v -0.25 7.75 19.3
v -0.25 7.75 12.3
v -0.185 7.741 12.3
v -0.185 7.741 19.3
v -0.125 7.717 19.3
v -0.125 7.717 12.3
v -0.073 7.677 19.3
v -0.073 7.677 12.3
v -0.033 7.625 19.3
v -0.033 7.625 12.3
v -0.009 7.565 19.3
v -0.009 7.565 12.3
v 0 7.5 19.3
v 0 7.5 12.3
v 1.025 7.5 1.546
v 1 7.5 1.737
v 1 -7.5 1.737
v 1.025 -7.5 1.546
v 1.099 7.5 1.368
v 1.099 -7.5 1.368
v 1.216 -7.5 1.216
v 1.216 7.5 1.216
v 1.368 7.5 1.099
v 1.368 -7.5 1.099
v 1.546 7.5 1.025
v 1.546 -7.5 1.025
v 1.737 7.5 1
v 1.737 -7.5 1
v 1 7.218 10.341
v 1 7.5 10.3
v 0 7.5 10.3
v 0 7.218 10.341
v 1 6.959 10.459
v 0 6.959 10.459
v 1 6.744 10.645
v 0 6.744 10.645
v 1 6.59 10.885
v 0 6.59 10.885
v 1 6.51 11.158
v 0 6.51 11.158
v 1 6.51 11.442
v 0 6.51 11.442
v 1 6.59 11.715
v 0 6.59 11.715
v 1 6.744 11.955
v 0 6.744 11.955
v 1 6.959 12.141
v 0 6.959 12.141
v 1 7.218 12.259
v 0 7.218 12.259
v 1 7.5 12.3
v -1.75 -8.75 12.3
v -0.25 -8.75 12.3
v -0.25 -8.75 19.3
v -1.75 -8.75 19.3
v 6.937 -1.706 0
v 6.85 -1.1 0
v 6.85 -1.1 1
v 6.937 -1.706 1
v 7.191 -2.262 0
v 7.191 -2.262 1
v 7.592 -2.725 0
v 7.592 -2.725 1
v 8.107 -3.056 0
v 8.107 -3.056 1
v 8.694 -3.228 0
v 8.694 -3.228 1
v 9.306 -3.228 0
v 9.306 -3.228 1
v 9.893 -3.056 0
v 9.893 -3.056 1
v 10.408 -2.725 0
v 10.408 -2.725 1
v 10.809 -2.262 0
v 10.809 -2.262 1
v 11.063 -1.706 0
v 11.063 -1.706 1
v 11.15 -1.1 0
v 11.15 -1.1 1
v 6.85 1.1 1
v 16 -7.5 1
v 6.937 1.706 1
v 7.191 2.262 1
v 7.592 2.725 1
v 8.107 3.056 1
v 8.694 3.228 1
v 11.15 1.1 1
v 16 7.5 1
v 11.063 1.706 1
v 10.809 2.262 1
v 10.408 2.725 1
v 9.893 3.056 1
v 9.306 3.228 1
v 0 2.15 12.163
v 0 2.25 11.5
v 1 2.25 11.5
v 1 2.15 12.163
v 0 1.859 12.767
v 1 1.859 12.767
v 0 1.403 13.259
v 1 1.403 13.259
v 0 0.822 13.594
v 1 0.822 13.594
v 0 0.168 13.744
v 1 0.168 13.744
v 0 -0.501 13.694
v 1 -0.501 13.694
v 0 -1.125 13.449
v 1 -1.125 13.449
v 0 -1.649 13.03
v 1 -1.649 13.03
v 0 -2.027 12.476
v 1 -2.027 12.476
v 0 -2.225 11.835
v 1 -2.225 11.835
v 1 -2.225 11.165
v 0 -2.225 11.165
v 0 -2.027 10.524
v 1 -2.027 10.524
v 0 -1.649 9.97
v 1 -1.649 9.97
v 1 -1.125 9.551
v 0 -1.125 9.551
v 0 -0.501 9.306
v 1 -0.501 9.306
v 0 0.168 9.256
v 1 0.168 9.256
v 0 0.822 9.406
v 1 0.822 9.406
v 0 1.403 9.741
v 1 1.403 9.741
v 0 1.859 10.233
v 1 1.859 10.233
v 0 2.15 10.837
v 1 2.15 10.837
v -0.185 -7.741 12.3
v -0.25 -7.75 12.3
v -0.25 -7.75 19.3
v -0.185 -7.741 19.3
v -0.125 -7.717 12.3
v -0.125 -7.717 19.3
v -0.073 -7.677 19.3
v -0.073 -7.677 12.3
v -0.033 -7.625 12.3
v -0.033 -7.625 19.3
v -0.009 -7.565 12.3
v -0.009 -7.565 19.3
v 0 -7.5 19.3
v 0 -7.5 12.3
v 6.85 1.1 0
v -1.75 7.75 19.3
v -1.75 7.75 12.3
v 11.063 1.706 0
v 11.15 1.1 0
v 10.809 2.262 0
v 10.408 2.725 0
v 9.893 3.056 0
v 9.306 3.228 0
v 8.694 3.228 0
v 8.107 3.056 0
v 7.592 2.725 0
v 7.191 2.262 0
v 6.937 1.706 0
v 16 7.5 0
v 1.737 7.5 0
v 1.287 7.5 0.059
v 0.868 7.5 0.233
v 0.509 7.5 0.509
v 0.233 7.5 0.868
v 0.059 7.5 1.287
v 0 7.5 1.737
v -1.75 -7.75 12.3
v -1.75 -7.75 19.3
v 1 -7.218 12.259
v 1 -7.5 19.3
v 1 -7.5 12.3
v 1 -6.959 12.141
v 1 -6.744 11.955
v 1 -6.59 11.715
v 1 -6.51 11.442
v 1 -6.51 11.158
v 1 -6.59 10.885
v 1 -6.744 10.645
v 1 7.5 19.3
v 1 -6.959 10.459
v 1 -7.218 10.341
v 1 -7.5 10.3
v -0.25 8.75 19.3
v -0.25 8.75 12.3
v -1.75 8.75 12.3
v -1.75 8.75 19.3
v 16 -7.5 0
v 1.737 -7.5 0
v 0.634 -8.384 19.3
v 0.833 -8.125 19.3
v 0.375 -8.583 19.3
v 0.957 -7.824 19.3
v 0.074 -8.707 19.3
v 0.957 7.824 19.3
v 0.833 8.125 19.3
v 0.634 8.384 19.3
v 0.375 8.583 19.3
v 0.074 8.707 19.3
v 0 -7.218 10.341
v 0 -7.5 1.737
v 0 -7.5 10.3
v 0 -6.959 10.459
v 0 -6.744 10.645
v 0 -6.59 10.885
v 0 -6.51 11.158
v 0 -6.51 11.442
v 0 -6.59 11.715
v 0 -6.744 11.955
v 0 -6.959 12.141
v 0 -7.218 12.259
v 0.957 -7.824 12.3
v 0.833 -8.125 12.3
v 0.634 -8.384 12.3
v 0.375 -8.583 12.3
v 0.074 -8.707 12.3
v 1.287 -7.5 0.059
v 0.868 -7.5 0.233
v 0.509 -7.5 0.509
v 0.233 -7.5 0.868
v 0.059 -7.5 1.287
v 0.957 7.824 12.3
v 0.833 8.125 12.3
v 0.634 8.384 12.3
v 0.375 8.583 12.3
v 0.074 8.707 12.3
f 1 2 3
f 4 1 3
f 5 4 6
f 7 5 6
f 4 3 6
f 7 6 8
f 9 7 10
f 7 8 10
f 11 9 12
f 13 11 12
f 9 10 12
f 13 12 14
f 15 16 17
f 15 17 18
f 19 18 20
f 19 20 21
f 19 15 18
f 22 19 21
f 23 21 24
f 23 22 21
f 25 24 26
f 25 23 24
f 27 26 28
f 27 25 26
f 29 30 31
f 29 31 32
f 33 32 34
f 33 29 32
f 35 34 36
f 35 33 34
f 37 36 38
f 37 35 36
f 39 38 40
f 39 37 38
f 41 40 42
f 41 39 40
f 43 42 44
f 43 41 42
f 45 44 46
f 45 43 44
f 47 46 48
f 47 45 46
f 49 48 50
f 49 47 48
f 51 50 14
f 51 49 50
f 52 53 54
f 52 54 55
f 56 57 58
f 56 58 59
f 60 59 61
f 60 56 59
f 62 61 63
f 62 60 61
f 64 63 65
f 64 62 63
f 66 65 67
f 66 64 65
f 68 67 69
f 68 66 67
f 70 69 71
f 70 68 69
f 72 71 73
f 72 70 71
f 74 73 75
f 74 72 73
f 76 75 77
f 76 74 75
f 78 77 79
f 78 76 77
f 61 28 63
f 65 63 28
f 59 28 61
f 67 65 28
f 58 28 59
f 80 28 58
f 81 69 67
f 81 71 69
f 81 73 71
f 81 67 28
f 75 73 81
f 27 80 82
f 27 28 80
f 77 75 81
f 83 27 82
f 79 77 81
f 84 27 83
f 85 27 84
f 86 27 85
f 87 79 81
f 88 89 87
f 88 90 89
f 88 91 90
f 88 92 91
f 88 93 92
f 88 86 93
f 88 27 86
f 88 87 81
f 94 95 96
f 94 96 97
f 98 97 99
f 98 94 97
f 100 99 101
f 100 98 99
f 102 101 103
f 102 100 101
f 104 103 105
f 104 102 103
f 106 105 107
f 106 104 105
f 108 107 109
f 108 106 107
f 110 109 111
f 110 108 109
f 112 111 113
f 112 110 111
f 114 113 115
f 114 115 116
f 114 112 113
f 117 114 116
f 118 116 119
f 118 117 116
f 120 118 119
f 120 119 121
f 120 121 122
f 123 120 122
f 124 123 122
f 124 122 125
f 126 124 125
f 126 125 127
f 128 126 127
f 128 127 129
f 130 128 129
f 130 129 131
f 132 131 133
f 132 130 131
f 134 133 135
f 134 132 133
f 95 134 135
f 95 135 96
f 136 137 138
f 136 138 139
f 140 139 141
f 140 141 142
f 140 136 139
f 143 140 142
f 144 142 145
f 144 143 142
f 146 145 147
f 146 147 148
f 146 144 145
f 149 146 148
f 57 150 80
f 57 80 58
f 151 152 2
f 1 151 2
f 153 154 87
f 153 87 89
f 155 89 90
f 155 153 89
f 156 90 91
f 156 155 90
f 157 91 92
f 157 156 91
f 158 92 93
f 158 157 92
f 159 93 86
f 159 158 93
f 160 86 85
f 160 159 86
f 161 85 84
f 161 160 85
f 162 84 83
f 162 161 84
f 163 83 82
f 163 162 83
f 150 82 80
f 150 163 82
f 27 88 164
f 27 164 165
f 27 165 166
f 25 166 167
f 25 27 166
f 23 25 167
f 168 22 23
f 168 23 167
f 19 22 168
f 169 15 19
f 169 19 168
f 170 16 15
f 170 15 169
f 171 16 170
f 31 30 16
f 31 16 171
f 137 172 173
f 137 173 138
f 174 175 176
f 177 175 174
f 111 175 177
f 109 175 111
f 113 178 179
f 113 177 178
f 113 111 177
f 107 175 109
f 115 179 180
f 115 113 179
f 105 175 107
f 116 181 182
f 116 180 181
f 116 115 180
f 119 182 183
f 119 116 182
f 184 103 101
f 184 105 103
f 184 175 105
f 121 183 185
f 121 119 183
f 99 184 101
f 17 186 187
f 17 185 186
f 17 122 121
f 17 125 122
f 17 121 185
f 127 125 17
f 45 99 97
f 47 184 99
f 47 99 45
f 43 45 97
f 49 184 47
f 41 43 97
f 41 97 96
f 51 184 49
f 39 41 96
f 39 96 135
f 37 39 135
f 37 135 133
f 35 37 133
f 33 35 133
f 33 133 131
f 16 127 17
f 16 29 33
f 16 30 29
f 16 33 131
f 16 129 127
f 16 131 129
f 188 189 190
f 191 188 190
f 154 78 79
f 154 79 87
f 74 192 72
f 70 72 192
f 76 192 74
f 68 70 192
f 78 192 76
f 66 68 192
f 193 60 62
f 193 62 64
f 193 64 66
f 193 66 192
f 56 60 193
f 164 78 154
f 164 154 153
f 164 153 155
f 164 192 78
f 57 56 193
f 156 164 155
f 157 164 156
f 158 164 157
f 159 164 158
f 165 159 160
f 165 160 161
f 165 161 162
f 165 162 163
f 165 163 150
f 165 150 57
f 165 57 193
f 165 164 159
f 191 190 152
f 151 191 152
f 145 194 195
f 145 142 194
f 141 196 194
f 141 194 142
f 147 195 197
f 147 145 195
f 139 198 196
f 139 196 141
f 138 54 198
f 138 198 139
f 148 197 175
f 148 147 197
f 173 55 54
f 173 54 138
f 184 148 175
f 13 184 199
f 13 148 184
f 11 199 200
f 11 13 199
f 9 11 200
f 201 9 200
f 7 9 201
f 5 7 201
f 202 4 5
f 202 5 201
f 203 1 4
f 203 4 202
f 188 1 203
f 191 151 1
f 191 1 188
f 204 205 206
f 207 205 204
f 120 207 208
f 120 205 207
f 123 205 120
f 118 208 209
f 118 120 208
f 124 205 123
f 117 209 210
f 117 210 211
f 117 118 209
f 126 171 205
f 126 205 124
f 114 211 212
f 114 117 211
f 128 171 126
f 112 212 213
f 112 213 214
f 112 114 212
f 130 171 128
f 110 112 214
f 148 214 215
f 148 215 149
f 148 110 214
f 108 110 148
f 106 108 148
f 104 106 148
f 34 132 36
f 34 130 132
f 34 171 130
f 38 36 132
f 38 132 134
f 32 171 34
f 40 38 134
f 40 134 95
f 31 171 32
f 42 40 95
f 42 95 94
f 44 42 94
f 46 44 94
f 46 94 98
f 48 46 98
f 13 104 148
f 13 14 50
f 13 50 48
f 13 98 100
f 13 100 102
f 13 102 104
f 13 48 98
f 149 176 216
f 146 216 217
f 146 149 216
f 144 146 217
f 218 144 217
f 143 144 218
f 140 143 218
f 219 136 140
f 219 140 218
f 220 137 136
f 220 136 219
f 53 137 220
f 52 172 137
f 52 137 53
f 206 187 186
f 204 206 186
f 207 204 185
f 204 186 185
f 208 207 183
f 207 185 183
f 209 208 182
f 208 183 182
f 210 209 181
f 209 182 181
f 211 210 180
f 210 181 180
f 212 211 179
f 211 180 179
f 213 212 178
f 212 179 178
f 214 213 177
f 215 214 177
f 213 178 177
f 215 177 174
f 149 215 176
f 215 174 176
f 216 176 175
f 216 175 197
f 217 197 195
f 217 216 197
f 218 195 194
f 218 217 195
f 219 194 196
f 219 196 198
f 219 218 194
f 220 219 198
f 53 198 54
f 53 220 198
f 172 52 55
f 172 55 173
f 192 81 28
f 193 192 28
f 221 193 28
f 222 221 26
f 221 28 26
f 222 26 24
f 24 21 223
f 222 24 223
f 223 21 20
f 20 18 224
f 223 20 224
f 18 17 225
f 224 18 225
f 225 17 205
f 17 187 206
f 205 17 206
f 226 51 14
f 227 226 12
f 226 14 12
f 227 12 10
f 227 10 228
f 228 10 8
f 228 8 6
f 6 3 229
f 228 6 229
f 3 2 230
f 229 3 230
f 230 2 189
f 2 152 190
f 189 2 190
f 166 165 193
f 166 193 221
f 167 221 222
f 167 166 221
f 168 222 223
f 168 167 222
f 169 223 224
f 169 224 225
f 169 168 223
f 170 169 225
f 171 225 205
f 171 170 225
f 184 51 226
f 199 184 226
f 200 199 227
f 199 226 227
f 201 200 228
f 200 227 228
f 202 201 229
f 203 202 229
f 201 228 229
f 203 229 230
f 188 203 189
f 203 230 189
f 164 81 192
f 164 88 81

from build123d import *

# Parameters (mm, degrees)
BASE_FLANGE_DEPTH        = 7.5
NOTCH_CUT_DEPTH          = 26.568339797
EDGE_FLANGE1_DEPTH       = 7
M4_CLEARANCE_SLOT1_DEPTH = 1
HOLE1_OUTLINE_R          = 2.25
HOLE1_DEPTH              = 1


# Read off the part's stored shape, not the designer's step: M4 Clearance Slot1, Hole1
# Sheet-metal steps are written as plain solids
with BuildPart() as part:
    # Profile Sketch → Base Flange (new, symmetric)
    with BuildSketch(Plane(origin=(171.772586935, 0, 3.13889728), x_dir=(-1, 0, 0), z_dir=(0, 1, 0))):
        with BuildLine():
            Line((155.772586935, -3.13889728), (170.035986935, -3.13889728))
            ThreePointArc((170.035986935, -3.13889728), (171.263948571, -2.630258916), (171.772586935, -1.40229728))
            Line((171.772586935, -1.40229728), (171.772586935, 16.16110272))
            Line((171.772586935, 16.16110272), (170.772586935, 16.16110272))
            Line((170.772586935, 16.16110272), (170.772586935, -1.40229728))
            ThreePointArc((170.772586935, -1.40229728), (170.55684179, -1.923152135), (170.035986935, -2.13889728))
            Line((170.035986935, -2.13889728), (155.772586935, -2.13889728))
            Line((155.772586935, -2.13889728), (155.772586935, -3.13889728))
        make_face()
    extrude(amount=BASE_FLANGE_DEPTH, both=True)

    # Sketch1 → Notch Cut (cut, symmetric)
    with BuildSketch(Plane(origin=(1, 0, 0), x_dir=(0, 0, -1), z_dir=(1, 0, 0))):
        with BuildLine():
            Line((-10.3, -56.296391585), (-10.3, -7.5))
            ThreePointArc((-10.3, -7.5), (-11.3, -6.5), (-12.3, -7.5))
            Line((-12.3, -7.5), (-12.3, -56.296391585))
            Line((-12.3, -56.296391585), (-12.3, -153.889174754))
            Line((-12.3, -153.889174754), (-10.3, -153.889174754))
            Line((-10.3, -153.889174754), (-10.3, -56.296391585))
        make_face()
    notch_cut = extrude(amount=NOTCH_CUT_DEPTH, both=True, mode=Mode.SUBTRACT)

    # Edge-Flange1 section (across the edge) → Edge-Flange1 (add)
    with BuildSketch(Plane(origin=(0, -7.75, 12.3), x_dir=(0, 1, 0), z_dir=(0, 0, 1))):
        with BuildLine():
            Line((-1, 0.25), (-1, 1.75))
            Line((-1, 1.75), (0, 1.75))
            Line((0, 1.75), (0, 0.25))
            ThreePointArc((0, 0.25), (0.073223305, 0.073223305), (0.25, 0))
            Line((0.25, 0), (0.25, -1))
            ThreePointArc((0.25, -1), (-0.633883476, -0.633883476), (-1, 0.25))
        make_face()
    edge_flange1 = extrude(amount=EDGE_FLANGE1_DEPTH)

    # Alignment Tab Mirror: Notch Cut, Edge-Flange1 across plane
    add(notch_cut.mirror(Plane.ZX), mode=Mode.SUBTRACT)
    add(edge_flange1.mirror(Plane.ZX))

    # M4 Clearance Slot1 outline → M4 Clearance Slot1 (cut)
    with BuildSketch(Plane.XY):
        with BuildLine():
            Line((11.15, -1.1), (11.15, 1.1))
            ThreePointArc((11.15, 1.1), (9, 3.25), (6.85, 1.1))
            Line((6.85, 1.1), (6.85, -1.1))
            ThreePointArc((6.85, -1.1), (9, -3.25), (11.15, -1.1))
        make_face()
    extrude(amount=M4_CLEARANCE_SLOT1_DEPTH, mode=Mode.SUBTRACT)

    # Hole1 outline → Hole1 (cut)
    with BuildSketch(Plane.YZ):
        with Locations((0, 11.5)):
            Circle(HOLE1_OUTLINE_R)
    extrude(amount=HOLE1_DEPTH, mode=Mode.SUBTRACT)


solid = part.part
